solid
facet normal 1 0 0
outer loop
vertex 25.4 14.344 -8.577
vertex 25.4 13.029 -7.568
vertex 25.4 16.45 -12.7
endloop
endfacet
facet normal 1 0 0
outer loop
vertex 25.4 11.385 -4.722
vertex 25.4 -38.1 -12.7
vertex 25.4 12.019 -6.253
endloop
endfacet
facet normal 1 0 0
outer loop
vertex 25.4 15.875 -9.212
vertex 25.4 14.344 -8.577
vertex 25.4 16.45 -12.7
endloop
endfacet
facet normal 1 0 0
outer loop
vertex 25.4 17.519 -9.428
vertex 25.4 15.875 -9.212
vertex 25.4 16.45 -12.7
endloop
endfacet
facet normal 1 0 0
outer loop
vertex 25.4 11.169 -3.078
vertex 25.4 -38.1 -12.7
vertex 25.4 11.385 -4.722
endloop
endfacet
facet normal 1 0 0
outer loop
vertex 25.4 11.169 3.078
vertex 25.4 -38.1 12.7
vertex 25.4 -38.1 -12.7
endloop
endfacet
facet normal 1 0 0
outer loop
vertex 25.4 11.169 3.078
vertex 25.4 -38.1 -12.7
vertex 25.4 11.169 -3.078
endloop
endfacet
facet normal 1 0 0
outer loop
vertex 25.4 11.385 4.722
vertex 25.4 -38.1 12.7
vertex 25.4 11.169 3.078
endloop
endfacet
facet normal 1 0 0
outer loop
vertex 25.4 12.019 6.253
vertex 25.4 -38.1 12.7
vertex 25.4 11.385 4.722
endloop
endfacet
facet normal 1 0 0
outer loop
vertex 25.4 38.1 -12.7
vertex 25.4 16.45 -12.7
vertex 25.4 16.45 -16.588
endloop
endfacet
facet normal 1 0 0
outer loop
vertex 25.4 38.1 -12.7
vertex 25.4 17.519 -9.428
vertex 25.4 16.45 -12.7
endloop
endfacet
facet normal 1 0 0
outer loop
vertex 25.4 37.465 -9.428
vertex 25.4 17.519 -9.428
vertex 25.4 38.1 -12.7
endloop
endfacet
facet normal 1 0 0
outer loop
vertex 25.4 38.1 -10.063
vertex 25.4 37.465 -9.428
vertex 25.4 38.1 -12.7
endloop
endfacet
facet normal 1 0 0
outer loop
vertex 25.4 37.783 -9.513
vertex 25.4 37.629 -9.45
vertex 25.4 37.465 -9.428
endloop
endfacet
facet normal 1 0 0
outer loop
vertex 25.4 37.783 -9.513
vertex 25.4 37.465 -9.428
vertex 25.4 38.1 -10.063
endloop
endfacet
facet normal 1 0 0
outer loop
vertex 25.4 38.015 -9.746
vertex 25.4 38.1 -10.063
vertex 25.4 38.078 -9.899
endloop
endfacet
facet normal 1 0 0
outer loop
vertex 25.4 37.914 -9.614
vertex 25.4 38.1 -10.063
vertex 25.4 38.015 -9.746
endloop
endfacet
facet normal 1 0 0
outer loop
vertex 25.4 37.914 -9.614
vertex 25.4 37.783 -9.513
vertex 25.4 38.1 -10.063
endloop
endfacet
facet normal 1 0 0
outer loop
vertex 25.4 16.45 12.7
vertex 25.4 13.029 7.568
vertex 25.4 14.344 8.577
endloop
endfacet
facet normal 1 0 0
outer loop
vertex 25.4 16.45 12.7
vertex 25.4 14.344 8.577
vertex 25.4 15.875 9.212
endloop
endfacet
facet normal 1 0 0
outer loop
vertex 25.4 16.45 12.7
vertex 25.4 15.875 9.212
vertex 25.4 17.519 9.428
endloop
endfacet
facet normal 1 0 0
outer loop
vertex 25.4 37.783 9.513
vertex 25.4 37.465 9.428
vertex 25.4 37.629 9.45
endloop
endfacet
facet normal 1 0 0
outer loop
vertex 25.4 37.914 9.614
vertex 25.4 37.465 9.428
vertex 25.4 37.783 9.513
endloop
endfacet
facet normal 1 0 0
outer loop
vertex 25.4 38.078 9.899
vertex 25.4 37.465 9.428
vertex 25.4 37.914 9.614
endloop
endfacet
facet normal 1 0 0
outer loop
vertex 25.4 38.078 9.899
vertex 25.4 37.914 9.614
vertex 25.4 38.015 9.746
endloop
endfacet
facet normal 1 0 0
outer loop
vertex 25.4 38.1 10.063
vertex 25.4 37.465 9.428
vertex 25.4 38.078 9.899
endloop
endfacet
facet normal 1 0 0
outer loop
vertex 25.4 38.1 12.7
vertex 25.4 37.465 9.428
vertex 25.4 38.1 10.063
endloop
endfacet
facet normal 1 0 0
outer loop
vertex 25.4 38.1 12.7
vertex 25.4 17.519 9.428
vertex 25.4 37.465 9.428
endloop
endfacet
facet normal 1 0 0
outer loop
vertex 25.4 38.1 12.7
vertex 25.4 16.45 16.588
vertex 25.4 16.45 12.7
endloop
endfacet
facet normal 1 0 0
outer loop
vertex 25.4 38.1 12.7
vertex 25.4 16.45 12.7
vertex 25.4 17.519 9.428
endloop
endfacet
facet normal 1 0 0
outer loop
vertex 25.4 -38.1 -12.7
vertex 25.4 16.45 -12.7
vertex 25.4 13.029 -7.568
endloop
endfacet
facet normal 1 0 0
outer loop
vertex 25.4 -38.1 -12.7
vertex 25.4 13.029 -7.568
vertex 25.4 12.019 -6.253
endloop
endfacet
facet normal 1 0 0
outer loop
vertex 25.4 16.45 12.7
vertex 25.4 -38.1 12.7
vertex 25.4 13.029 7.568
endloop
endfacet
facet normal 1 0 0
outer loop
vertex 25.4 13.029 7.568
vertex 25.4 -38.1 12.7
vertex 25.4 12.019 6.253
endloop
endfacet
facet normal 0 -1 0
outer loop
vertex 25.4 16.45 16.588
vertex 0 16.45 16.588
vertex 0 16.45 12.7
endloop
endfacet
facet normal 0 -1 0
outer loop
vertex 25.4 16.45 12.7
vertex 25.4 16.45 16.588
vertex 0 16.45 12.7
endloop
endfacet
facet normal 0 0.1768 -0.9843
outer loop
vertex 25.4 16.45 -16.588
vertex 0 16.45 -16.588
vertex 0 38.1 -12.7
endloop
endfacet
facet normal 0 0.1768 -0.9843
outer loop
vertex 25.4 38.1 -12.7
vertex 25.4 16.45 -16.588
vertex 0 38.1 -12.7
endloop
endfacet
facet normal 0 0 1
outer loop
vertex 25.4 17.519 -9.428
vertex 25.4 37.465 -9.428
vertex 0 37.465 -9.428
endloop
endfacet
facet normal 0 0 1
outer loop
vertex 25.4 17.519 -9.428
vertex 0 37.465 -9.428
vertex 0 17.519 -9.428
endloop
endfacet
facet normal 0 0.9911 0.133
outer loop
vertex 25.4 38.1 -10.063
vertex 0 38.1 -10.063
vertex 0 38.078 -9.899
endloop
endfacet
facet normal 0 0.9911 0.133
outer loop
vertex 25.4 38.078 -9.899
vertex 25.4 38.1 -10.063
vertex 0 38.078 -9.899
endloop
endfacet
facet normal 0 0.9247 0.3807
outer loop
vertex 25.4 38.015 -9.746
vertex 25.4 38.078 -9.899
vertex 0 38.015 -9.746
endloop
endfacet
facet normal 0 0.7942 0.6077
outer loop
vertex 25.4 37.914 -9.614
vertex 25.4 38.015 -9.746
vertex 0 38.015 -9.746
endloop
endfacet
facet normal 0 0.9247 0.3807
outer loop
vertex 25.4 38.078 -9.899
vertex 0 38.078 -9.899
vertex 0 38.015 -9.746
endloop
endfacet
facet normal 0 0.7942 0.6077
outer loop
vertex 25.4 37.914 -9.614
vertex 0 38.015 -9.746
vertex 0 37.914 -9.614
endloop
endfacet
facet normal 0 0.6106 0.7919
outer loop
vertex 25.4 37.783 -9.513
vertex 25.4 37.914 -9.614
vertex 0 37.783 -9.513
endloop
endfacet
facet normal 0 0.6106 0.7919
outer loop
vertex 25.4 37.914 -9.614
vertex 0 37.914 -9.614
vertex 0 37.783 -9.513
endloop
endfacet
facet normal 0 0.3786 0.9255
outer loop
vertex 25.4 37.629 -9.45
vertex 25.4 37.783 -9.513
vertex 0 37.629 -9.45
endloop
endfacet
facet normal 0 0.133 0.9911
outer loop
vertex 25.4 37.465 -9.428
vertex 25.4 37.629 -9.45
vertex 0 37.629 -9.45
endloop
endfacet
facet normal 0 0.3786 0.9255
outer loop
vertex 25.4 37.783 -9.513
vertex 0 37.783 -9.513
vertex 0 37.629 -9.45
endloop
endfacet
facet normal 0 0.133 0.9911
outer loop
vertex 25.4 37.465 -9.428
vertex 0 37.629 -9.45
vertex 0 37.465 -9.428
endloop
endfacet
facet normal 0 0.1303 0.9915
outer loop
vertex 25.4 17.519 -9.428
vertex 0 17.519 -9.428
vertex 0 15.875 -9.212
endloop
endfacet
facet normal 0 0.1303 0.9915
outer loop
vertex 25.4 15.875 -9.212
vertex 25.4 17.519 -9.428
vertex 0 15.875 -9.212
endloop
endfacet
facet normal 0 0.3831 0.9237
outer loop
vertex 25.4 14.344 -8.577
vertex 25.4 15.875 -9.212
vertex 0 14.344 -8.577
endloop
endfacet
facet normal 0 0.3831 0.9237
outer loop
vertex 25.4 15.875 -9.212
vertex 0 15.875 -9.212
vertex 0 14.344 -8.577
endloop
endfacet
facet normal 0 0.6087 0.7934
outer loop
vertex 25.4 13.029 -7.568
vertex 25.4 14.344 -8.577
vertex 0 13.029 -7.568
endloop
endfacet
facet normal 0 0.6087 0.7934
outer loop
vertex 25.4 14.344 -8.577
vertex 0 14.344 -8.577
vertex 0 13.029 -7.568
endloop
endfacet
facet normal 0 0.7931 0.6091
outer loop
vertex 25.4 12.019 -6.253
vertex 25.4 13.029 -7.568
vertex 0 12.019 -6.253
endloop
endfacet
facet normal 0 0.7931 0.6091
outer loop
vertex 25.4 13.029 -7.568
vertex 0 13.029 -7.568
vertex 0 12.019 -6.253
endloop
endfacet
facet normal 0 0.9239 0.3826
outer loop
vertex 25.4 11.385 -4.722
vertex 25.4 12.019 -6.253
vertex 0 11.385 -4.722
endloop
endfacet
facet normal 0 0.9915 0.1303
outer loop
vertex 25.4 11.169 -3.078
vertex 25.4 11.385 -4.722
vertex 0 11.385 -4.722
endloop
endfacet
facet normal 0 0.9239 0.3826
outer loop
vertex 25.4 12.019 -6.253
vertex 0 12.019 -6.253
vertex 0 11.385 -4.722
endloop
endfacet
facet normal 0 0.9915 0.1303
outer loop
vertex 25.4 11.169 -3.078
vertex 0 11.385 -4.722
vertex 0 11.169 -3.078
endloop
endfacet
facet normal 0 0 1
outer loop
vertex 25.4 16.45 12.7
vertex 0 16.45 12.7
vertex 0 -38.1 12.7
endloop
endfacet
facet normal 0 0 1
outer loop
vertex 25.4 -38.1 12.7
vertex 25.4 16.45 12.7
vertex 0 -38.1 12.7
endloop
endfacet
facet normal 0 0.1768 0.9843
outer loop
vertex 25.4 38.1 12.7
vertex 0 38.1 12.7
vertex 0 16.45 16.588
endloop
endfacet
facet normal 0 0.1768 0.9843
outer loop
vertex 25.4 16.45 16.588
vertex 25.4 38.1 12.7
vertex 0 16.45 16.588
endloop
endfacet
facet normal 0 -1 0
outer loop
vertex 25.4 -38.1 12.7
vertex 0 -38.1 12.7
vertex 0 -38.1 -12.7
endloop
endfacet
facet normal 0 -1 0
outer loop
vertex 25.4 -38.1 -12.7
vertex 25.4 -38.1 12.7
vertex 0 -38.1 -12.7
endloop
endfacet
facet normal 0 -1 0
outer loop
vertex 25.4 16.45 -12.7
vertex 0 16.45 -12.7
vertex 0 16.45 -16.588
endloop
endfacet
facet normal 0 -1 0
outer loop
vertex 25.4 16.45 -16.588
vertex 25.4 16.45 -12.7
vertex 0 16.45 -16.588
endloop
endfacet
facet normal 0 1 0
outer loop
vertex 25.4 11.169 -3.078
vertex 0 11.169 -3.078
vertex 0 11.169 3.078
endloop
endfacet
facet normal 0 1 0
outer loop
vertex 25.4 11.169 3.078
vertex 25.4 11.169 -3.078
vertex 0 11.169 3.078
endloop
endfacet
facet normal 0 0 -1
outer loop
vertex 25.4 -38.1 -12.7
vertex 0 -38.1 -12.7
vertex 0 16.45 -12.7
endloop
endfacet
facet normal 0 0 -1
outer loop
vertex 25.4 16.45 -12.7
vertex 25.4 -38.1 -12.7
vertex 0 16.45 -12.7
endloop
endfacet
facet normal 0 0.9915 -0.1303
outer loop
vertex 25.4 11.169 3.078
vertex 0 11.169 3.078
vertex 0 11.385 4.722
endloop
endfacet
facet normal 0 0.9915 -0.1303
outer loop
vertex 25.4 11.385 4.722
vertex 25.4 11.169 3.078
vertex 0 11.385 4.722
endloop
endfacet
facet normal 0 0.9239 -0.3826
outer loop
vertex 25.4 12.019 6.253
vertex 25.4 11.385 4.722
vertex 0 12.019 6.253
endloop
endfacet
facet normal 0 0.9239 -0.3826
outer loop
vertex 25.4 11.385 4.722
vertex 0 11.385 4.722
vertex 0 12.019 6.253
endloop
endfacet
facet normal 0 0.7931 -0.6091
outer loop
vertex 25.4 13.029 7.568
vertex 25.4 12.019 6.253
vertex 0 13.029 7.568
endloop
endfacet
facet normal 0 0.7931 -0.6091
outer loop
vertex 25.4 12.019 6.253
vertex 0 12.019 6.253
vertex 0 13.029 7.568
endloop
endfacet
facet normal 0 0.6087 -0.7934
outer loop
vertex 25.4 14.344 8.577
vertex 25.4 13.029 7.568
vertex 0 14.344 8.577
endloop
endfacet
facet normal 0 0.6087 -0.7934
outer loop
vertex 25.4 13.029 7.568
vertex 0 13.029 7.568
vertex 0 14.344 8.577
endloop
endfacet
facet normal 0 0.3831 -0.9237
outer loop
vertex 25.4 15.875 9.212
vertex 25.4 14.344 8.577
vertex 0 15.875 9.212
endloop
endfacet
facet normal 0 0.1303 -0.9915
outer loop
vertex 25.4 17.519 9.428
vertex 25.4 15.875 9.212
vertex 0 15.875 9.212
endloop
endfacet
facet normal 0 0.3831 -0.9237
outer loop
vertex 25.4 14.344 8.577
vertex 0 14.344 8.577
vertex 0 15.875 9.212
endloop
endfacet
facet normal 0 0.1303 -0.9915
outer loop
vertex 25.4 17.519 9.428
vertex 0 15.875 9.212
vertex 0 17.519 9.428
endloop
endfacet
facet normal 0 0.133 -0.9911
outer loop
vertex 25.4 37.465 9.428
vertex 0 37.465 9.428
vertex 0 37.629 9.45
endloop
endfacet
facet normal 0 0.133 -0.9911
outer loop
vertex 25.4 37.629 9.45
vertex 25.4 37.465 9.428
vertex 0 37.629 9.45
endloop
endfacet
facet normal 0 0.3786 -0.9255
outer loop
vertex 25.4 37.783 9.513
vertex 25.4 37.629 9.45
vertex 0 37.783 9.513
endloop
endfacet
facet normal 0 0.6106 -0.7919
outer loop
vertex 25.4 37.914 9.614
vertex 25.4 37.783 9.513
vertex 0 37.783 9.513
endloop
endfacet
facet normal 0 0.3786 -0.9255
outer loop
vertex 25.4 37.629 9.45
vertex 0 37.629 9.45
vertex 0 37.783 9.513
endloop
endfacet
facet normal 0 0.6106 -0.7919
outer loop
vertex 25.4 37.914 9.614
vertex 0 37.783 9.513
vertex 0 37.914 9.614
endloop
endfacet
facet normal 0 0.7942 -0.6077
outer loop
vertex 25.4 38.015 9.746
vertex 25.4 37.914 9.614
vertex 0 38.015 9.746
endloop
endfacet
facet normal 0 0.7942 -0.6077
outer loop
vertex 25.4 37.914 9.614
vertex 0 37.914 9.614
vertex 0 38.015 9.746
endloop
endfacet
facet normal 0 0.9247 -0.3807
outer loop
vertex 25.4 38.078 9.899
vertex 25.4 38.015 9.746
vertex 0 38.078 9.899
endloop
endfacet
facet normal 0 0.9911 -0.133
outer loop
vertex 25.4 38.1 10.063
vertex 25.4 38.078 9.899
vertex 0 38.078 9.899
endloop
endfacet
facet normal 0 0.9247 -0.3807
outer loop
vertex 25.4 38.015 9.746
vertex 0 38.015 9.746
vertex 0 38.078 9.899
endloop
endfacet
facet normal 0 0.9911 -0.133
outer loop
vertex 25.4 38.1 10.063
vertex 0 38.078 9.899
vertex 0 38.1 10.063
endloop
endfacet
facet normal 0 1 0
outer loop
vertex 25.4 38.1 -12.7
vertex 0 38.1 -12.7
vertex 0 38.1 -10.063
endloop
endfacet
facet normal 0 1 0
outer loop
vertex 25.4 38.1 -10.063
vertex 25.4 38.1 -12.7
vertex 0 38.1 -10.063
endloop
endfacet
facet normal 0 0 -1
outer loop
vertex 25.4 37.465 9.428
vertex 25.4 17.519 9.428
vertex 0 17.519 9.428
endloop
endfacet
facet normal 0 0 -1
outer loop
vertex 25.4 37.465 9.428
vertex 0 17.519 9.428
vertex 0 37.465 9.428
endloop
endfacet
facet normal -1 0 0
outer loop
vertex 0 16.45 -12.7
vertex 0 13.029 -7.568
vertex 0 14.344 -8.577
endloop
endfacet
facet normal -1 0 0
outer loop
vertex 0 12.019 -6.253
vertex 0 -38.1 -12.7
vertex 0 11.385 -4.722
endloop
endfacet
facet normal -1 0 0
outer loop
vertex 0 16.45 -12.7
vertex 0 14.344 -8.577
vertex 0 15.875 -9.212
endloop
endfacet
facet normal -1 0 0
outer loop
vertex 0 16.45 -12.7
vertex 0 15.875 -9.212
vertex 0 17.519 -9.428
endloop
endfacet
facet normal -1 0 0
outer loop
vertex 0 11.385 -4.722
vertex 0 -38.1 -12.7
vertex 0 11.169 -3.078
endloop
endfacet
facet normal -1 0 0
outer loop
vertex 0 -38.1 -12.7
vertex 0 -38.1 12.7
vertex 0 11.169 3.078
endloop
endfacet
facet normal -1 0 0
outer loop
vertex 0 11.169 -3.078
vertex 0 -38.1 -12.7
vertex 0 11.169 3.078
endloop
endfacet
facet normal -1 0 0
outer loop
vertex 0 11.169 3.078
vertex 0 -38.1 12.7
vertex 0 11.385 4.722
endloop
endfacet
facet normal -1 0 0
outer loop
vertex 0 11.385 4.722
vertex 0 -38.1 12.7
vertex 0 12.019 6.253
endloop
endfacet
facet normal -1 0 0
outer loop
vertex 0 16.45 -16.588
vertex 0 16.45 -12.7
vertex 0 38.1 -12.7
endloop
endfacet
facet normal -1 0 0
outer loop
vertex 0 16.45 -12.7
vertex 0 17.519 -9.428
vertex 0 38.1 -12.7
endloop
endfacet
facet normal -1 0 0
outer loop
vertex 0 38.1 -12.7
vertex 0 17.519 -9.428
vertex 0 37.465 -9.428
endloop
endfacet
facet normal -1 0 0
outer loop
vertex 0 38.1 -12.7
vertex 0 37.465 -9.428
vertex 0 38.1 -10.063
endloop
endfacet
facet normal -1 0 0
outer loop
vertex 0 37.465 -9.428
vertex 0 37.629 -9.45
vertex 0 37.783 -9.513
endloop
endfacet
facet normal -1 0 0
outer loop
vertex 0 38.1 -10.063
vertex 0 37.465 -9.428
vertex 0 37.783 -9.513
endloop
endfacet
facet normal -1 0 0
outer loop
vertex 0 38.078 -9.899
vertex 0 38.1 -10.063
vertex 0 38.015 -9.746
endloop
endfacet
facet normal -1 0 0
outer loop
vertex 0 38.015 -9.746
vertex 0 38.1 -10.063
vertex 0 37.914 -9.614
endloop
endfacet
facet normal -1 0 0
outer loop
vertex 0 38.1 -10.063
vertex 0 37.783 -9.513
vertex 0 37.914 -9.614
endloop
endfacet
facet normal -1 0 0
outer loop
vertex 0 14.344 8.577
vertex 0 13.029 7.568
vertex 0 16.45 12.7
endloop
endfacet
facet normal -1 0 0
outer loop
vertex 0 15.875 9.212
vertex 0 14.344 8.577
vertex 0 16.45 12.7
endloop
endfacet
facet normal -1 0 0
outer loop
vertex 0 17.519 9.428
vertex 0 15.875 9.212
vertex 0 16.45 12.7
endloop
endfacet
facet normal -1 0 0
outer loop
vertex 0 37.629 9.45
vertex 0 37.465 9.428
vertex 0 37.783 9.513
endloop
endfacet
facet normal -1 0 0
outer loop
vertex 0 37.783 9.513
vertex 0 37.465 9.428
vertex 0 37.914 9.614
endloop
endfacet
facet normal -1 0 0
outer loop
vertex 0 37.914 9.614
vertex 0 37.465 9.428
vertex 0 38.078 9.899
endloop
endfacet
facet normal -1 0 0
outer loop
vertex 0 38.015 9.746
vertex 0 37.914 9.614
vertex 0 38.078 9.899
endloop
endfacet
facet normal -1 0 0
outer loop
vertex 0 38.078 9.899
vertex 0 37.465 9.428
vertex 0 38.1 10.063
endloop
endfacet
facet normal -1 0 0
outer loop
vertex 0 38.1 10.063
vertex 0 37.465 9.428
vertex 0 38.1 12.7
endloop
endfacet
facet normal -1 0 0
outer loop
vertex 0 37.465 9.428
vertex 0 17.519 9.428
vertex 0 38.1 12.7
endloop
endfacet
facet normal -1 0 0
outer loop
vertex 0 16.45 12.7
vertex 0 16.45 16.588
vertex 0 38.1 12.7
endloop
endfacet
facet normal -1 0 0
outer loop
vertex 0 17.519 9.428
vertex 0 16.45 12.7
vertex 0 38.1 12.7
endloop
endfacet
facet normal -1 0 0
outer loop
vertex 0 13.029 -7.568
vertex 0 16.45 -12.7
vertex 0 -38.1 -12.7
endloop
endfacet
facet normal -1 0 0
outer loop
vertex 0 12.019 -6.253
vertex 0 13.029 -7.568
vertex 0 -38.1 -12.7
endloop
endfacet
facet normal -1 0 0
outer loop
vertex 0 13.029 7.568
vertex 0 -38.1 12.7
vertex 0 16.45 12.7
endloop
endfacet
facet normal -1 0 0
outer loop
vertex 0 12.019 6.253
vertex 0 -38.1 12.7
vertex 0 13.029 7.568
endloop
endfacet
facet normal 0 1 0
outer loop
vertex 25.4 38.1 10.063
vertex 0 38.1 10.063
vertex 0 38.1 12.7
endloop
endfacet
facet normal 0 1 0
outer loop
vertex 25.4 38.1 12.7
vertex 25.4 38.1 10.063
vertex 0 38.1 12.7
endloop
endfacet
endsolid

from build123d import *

# Parameters (mm, degrees)
F1_DEPTH = 25.4


with BuildPart() as f1:
    # F0 (on Right) → F1 (new body)
    with BuildSketch(Plane.YZ):
        with BuildLine():
            Line((16.450379, 12.7), (-38.1, 12.7))
            Line((-38.1, 12.7), (-38.1, -12.7))
            Line((-38.1, -12.7), (16.450379, -12.7))
            Line((16.450379, -12.7), (38.1, -12.7))
            Line((38.1, -12.7), (38.1, -10.063089))
            ThreePointArc((38.1, -10.063089), (37.914013, -9.614076), (37.465, -9.428089))
            Line((37.465, -9.428089), (17.518706, -9.428089))
            ThreePointArc((17.518706, -9.428089), (13.028578, -7.568217), (11.168706, -3.078089))
            Line((11.168706, -3.078089), (11.168706, 3.078089))
            ThreePointArc((11.168706, 3.078089), (13.028578, 7.568217), (17.518706, 9.428089))
            Line((17.518706, 9.428089), (37.465, 9.428089))
            ThreePointArc((37.465, 9.428089), (37.914013, 9.614076), (38.1, 10.063089))
            Line((38.1, 10.063089), (38.1, 12.7))
            Line((38.1, 12.7), (16.450379, 12.7))
        make_face()
        Polygon((16.450379, 16.587621), (16.450379, 12.7), (38.1, 12.7), align=None)
        Polygon((38.1, -12.7), (16.450379, -12.7), (16.450379, -16.587621), align=None)
    extrude(amount=F1_DEPTH)


solid = f1.part
